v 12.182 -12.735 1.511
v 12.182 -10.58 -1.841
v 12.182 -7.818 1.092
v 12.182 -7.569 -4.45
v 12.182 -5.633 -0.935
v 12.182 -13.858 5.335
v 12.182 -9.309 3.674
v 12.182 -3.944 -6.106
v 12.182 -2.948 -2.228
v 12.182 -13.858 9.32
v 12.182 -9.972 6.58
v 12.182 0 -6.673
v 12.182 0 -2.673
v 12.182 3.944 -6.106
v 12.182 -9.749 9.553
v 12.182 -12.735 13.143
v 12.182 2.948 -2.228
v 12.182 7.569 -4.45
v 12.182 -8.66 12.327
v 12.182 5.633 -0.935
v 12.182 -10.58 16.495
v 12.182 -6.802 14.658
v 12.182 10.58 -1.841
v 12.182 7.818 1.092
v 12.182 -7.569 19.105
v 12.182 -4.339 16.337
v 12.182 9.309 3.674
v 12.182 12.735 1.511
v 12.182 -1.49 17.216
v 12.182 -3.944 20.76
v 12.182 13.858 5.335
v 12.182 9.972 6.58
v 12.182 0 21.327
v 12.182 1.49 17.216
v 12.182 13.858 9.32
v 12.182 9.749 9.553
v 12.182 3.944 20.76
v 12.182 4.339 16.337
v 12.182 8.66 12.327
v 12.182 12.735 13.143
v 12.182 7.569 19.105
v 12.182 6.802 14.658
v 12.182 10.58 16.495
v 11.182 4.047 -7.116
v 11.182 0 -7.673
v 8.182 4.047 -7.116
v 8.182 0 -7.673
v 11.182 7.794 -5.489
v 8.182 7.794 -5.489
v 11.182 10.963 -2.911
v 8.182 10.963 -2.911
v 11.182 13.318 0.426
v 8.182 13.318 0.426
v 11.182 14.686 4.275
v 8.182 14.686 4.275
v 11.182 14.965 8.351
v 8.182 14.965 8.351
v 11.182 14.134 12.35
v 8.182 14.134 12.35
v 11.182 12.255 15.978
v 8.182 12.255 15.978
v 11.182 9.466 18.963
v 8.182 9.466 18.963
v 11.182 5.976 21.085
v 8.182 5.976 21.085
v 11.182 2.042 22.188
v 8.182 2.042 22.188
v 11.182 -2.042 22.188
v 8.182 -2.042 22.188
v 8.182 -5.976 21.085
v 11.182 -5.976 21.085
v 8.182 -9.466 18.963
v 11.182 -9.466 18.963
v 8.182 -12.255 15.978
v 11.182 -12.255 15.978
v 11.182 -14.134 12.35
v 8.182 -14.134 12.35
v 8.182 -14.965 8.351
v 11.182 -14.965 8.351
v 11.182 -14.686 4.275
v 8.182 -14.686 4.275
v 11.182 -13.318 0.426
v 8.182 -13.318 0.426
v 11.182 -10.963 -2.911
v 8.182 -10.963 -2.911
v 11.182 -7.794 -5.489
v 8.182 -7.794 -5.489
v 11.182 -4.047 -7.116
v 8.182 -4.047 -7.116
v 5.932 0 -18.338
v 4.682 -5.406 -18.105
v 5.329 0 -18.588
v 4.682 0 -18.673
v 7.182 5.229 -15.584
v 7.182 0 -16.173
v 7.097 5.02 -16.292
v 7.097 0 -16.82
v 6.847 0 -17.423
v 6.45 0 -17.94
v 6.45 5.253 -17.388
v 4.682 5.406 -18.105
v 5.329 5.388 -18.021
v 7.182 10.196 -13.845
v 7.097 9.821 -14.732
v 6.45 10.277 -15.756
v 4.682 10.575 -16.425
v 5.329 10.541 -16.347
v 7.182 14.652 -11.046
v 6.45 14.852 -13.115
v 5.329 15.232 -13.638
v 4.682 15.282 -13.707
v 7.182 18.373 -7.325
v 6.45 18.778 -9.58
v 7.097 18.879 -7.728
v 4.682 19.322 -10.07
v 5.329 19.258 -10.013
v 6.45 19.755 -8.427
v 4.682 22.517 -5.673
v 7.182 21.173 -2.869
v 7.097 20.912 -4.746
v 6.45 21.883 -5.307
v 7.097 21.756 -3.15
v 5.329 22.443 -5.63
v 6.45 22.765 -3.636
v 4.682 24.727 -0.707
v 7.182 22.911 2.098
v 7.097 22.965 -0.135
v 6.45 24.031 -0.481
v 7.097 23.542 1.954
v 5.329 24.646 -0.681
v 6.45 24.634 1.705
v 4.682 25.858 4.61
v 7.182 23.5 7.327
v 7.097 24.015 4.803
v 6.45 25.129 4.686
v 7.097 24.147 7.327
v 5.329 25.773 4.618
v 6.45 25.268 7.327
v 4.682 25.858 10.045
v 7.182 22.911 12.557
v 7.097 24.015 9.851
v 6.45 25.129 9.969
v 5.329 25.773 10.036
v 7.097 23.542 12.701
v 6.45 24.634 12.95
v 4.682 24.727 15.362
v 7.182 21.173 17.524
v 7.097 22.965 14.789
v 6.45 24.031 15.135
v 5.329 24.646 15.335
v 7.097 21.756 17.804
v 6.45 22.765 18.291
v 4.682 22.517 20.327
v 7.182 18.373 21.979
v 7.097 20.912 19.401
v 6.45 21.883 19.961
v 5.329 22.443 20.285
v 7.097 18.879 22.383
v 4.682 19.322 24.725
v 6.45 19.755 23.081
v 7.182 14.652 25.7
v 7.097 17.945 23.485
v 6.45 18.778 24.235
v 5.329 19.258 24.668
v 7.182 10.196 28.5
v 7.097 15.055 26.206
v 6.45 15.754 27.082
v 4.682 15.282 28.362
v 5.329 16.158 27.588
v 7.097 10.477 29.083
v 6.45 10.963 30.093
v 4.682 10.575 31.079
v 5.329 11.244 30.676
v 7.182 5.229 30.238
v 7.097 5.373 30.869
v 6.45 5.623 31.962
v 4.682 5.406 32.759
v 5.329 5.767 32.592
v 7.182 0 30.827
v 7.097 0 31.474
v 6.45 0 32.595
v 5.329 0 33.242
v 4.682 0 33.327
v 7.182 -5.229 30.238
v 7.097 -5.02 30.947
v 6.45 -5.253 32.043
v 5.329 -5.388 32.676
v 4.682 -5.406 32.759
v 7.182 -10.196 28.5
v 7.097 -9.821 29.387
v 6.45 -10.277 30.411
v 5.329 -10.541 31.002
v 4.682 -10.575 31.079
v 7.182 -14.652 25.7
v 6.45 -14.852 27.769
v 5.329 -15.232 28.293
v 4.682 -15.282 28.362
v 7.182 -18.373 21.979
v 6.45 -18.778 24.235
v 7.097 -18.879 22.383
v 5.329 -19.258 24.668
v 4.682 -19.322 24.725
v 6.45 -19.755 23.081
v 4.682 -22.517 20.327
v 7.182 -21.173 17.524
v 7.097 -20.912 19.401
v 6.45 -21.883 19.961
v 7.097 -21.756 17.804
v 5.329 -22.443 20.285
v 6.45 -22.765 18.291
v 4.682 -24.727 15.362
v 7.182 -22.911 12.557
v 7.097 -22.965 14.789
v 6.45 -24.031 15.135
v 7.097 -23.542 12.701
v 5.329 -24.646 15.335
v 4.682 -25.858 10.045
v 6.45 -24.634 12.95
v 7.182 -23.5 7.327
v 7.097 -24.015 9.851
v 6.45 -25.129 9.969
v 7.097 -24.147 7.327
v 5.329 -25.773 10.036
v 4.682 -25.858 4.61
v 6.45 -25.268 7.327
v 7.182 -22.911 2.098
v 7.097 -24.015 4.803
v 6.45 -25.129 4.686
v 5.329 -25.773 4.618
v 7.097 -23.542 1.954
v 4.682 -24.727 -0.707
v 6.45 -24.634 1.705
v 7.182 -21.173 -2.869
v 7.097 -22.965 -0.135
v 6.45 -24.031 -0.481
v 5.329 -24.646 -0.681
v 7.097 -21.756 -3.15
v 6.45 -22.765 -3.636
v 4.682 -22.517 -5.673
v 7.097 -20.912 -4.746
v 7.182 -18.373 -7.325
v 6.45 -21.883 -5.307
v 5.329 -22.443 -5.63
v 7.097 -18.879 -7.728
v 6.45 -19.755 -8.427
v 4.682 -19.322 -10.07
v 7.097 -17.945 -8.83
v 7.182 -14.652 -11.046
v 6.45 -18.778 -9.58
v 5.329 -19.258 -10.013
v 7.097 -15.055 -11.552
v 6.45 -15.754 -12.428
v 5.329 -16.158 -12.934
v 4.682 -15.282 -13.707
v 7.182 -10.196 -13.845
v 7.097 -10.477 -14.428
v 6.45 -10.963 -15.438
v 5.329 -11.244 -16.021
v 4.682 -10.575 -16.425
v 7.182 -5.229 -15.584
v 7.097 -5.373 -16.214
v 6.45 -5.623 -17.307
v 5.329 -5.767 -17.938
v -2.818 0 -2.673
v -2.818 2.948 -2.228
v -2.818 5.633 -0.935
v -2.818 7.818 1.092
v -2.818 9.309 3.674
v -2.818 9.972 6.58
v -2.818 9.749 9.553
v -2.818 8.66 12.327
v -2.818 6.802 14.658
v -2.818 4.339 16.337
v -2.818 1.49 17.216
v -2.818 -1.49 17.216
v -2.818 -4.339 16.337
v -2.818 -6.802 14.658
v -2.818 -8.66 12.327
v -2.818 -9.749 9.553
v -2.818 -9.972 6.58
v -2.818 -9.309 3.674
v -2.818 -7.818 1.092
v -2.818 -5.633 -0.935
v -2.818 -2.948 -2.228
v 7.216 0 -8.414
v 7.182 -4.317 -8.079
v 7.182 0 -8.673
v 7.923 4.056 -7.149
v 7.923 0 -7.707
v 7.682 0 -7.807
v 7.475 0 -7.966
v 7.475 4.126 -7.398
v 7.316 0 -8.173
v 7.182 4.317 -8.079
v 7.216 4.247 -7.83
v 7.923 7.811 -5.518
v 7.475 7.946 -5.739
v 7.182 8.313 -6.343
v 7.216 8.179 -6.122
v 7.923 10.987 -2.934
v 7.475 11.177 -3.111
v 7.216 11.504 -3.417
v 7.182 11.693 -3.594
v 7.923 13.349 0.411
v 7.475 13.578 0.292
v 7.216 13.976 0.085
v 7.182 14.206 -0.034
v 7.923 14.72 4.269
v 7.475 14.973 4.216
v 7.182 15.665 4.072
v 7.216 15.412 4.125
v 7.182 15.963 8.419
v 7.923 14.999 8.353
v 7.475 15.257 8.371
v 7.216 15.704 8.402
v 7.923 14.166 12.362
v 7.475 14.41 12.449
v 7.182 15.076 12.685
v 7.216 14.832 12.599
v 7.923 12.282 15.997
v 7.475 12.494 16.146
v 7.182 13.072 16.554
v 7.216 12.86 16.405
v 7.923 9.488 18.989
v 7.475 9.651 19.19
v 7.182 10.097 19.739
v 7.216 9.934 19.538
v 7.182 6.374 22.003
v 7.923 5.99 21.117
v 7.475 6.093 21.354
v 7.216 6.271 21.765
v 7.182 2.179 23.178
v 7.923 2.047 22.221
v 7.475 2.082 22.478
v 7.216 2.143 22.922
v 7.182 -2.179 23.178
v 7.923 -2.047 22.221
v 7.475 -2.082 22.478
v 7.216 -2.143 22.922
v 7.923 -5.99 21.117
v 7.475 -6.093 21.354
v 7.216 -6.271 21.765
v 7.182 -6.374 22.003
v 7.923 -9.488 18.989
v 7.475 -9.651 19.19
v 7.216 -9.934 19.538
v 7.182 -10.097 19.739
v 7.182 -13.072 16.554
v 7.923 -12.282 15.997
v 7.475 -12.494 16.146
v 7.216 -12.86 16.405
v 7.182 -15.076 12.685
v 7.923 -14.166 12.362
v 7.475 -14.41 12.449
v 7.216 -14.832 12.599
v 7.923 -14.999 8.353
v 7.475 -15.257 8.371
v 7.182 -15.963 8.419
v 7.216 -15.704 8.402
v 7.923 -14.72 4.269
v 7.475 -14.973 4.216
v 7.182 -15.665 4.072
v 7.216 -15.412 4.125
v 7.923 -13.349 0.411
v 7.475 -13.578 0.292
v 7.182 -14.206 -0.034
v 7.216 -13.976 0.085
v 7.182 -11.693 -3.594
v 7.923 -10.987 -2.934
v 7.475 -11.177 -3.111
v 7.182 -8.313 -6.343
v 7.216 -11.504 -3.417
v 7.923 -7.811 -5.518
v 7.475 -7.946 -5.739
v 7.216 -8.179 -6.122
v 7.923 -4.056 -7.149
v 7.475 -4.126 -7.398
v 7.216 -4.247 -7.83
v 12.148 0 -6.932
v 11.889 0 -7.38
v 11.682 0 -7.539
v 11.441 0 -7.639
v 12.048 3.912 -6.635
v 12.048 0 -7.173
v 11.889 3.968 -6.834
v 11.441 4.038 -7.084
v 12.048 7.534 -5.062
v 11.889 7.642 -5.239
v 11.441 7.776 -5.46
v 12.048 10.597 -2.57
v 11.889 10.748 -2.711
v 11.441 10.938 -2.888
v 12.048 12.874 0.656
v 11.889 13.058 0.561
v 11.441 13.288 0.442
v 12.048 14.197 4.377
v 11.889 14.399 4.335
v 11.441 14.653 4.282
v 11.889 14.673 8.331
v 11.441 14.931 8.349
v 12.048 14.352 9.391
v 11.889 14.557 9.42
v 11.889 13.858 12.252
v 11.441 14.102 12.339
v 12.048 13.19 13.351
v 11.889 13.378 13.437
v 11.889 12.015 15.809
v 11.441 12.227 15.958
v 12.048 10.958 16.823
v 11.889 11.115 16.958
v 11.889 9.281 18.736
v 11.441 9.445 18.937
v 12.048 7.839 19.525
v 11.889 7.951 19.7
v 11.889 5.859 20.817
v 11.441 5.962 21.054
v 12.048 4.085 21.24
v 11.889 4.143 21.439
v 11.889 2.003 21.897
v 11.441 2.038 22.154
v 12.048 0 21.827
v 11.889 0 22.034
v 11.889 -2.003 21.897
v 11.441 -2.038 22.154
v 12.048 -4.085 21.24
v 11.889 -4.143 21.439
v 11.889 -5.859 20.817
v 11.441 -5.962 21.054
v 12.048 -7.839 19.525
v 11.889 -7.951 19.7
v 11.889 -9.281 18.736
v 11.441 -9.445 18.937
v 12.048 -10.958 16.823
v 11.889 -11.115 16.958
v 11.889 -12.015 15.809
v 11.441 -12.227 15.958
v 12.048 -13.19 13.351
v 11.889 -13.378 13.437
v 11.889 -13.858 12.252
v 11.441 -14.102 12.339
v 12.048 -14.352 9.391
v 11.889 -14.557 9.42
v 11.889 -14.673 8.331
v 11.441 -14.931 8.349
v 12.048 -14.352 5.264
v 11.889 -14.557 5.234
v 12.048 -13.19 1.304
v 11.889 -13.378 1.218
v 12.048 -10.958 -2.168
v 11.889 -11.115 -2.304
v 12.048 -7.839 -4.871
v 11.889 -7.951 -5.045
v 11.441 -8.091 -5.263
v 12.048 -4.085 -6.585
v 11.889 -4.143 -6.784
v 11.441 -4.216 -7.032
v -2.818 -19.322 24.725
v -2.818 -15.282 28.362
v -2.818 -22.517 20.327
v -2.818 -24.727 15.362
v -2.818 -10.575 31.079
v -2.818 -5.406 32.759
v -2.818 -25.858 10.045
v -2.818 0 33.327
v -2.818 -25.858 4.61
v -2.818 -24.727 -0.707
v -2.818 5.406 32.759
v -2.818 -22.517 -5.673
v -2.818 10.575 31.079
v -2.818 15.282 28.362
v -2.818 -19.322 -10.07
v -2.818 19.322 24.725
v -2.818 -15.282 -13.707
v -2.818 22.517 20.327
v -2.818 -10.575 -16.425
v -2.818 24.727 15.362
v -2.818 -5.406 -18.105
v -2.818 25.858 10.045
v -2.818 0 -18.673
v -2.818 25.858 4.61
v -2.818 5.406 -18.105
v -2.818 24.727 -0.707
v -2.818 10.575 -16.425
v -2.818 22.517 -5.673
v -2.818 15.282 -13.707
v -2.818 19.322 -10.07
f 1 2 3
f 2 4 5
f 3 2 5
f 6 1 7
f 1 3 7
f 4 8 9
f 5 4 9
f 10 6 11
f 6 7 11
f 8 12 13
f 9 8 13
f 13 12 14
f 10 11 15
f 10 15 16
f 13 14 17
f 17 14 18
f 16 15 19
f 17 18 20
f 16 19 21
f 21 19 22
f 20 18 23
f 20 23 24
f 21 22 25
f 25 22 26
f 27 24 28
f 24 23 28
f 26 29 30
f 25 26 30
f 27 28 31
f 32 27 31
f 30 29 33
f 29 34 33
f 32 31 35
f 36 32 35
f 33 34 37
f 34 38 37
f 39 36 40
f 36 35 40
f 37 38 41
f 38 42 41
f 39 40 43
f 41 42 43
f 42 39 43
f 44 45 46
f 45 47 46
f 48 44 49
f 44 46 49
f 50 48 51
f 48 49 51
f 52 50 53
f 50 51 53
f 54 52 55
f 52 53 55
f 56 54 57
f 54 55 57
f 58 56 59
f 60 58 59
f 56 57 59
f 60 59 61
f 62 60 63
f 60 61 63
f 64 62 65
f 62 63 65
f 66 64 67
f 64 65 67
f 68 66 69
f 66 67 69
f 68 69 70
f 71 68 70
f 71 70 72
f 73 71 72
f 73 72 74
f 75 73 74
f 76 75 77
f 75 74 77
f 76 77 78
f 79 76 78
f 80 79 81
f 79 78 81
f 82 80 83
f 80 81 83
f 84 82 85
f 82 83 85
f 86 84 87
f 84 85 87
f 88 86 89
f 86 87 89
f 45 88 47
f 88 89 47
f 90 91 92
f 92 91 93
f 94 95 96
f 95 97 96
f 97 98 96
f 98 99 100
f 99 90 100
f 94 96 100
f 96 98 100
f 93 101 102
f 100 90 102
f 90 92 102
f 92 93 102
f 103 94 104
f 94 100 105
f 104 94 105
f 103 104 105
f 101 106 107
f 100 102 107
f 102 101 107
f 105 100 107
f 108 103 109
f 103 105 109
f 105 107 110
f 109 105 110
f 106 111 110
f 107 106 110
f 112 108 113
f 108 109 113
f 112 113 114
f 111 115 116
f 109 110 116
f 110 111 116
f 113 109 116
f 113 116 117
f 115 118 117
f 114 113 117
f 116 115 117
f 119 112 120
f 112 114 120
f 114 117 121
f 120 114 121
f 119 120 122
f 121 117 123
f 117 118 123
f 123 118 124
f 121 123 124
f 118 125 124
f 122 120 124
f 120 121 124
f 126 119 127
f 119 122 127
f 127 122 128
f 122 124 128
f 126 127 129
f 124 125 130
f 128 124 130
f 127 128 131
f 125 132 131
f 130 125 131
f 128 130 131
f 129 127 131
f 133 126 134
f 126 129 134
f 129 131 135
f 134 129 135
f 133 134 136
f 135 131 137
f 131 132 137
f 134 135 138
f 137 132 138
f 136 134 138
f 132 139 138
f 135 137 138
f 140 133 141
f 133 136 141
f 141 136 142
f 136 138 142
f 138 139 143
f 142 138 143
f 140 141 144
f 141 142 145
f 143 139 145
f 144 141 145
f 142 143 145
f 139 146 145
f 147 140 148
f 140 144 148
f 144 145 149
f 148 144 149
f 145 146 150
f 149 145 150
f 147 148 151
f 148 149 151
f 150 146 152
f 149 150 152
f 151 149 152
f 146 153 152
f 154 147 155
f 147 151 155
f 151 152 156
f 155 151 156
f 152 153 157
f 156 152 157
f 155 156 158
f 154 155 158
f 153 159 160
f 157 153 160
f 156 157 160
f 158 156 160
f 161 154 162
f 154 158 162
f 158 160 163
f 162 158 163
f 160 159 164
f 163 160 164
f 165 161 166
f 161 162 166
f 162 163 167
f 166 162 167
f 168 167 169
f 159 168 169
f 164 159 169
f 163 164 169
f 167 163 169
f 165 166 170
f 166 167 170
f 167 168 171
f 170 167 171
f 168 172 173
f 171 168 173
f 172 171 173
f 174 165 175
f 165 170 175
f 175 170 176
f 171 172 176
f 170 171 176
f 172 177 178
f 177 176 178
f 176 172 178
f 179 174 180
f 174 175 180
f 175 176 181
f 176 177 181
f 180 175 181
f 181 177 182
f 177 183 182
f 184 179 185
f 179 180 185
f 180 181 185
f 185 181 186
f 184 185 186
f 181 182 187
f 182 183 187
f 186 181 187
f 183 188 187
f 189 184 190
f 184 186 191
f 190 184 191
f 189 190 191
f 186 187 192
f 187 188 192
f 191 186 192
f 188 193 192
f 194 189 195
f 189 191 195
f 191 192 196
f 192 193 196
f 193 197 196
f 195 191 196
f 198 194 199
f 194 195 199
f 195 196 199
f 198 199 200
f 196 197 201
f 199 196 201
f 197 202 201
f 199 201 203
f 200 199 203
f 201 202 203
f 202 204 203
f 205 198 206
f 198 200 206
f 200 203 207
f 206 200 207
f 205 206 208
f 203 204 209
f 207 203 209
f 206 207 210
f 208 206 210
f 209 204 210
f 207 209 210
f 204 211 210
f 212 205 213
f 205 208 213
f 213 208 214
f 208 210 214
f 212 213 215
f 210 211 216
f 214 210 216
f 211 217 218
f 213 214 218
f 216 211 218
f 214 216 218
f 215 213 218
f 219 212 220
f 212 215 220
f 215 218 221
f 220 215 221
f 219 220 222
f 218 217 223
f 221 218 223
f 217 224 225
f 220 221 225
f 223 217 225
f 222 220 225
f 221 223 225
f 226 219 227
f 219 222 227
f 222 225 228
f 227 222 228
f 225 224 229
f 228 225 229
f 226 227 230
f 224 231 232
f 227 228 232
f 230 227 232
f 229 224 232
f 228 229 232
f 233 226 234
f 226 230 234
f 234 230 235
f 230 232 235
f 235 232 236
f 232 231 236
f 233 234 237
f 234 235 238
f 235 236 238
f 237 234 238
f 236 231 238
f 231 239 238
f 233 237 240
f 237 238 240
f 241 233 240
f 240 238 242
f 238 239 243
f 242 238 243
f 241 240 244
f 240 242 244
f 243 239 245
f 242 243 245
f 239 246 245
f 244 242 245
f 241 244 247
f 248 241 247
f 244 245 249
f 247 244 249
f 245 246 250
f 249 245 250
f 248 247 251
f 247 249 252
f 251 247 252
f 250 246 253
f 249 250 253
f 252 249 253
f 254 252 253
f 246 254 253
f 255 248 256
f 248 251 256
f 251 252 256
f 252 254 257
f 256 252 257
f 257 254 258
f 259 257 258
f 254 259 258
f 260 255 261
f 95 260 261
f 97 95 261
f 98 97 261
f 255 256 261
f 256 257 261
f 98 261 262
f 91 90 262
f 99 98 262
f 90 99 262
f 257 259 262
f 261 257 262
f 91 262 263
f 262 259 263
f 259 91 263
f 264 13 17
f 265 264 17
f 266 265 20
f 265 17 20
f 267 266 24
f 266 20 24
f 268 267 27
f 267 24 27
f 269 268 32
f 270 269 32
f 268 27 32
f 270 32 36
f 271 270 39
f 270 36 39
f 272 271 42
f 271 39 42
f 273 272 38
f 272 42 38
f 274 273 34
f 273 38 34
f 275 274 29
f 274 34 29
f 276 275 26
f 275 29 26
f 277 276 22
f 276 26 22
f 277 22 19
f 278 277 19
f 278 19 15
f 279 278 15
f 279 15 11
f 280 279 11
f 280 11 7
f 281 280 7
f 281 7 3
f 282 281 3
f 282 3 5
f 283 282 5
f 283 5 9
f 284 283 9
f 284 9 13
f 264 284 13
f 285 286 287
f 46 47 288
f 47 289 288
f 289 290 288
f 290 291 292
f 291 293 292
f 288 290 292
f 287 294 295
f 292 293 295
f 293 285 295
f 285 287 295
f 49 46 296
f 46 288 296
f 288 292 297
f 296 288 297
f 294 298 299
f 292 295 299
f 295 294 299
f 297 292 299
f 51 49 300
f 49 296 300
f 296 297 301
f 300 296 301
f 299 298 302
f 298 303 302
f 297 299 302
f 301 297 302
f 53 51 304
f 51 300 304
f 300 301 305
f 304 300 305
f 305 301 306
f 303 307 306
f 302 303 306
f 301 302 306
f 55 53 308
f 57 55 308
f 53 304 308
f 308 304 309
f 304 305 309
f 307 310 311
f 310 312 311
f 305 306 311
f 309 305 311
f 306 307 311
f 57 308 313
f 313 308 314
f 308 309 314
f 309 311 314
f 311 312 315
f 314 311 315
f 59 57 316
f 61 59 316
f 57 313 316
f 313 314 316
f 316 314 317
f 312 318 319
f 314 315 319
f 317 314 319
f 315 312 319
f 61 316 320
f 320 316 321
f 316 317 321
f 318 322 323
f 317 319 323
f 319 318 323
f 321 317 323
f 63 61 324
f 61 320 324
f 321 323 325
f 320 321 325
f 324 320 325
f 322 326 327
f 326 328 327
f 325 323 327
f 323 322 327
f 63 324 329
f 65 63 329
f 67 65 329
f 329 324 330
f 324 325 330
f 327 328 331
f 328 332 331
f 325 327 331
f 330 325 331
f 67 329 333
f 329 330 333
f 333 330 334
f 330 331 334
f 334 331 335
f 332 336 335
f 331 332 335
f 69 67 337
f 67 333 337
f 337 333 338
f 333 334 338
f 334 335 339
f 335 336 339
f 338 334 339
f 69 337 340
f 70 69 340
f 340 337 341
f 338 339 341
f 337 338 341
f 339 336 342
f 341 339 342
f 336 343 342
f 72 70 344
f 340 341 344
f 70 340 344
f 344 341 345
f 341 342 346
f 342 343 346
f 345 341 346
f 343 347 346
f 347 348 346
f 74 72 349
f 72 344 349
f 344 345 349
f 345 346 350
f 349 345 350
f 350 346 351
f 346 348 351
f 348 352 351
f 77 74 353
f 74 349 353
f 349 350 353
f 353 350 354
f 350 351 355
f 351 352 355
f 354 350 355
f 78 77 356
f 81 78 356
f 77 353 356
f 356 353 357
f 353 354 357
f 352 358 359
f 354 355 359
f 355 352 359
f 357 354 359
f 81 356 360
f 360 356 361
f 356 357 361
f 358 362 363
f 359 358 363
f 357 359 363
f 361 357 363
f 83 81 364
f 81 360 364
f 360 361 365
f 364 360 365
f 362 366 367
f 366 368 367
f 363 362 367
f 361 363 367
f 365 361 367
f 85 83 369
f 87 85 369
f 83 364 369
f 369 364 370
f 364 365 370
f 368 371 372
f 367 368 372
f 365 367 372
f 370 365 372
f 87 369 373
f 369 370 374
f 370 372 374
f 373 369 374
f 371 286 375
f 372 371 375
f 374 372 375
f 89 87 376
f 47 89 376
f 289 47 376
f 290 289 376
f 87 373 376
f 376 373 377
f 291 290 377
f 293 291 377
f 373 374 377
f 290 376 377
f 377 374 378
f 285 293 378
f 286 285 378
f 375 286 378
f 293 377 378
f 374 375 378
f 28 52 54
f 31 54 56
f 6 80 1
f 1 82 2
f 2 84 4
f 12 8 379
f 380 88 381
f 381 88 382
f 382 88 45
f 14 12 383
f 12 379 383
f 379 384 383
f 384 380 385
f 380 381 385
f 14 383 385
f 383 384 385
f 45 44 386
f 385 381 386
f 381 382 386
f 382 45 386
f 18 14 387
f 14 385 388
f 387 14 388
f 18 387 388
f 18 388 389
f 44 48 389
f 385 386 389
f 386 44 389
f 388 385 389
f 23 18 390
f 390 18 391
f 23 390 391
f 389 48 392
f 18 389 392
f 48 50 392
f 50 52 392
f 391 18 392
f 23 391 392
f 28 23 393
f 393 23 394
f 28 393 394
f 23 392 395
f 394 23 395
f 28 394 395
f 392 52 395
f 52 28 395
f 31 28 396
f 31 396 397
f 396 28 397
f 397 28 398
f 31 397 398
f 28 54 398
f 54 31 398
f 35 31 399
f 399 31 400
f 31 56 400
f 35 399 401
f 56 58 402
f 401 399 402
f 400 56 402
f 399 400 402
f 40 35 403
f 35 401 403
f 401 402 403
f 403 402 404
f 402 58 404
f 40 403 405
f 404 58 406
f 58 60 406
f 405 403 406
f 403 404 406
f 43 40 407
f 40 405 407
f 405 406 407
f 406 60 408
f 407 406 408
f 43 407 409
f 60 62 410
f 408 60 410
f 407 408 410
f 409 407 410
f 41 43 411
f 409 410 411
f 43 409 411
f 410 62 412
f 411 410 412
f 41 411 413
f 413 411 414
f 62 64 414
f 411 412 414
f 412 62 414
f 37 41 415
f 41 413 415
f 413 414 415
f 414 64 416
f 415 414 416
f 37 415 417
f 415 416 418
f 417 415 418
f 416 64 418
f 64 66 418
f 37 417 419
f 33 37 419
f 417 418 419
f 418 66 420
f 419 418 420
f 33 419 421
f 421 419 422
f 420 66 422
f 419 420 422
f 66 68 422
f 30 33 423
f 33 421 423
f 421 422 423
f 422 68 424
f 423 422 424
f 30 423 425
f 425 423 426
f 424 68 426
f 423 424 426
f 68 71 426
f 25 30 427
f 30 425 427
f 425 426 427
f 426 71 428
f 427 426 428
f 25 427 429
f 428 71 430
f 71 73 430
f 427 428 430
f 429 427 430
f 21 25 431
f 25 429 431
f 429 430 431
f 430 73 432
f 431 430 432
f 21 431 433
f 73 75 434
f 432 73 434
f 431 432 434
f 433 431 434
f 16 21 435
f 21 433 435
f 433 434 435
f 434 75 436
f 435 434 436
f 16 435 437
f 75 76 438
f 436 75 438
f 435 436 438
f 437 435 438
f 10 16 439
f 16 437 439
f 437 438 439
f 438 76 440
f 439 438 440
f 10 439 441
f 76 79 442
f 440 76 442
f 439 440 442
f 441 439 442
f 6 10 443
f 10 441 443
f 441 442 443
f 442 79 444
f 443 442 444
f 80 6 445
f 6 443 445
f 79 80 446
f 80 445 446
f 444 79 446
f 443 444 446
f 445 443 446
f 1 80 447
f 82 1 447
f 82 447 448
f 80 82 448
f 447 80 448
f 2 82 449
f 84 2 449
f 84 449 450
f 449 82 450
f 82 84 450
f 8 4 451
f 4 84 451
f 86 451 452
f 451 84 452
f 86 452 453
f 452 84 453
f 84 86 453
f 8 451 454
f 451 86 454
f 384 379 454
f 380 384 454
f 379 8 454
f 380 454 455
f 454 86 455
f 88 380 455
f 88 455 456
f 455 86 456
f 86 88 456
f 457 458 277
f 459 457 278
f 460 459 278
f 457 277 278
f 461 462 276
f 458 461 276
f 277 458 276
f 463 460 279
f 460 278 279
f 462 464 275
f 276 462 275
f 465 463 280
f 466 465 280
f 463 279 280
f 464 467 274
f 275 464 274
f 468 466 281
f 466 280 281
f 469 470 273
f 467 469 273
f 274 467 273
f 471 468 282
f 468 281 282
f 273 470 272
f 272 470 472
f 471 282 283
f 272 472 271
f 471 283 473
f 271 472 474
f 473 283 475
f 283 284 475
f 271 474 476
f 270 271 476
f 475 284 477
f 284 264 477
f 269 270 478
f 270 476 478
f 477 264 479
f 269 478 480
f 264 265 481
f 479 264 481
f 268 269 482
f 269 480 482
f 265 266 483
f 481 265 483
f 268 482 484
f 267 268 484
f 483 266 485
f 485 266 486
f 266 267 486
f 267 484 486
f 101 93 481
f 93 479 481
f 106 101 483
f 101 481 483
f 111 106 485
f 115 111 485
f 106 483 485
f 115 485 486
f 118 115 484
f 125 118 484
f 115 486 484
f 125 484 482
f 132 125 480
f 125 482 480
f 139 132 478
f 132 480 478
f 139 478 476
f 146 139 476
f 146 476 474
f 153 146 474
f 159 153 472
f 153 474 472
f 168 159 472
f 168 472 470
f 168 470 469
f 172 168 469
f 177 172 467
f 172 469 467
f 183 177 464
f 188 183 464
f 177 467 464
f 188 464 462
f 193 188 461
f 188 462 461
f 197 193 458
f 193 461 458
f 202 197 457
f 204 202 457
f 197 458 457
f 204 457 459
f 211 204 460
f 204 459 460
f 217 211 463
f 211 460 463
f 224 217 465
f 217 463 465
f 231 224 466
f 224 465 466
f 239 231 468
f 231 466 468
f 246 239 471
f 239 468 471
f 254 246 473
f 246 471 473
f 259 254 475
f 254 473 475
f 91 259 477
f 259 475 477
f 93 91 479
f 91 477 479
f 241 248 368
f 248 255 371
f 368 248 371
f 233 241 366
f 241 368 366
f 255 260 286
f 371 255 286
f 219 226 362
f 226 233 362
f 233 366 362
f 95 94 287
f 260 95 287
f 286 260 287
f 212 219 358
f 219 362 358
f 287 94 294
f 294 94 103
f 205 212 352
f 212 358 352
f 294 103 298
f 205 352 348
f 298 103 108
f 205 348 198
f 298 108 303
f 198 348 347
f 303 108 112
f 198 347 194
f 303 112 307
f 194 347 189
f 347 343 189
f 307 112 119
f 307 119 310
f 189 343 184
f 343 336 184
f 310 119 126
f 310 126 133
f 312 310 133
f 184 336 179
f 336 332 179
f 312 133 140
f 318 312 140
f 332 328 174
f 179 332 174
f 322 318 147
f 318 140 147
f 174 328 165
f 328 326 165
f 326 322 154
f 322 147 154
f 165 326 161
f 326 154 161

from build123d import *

# Parameters (mm, degrees)
SKETCH2_R      = 10
EXTRUDE1_DEPTH = 16


with BuildPart() as part:
    # Sketch1 → Revolve1 (revolve)
    with BuildSketch(Plane(origin=(0, 0, 0), x_dir=(1, 0, 0), z_dir=(0, 1, 0))):
        with BuildLine():
            Line((-2.818193867, -7.327304055), (1.105880126, -7.327304055))
            Line((1.105880126, -7.327304055), (12.181806133, -7.327304055))
            Line((12.181806133, -7.327304055), (12.181806133, 6.672695945))
            ThreePointArc((12.181806133, 6.672695945), (11.888912914, 7.379802726), (11.181806133, 7.672695945))
            Line((11.181806133, 7.672695945), (8.181806133, 7.672695945))
            ThreePointArc((8.181806133, 7.672695945), (7.474699351, 7.965589164), (7.181806133, 8.672695945))
            Line((7.181806133, 8.672695945), (7.181806133, 16.172695945))
            ThreePointArc((7.181806133, 16.172695945), (6.449573086, 17.940462898), (4.681806133, 18.672695945))
            Line((4.681806133, 18.672695945), (-2.818193867, 18.672695945))
            Line((-2.818193867, 18.672695945), (-2.818193867, -7.327304055))
        make_face()
    revolve(axis=Axis((-2.818193867, 0, 7.327304055), (1, 0, 0)))

    # Sketch2 → Extrude1 (cut, through all)
    with BuildSketch(Plane(origin=(12.181806133, 0, 0), x_dir=(0, 0, -1), z_dir=(1, 0, 0))):
        with Locations((-7.327304055, 0)):
            Circle(SKETCH2_R)
    extrude(amount=-EXTRUDE1_DEPTH, mode=Mode.SUBTRACT)


solid = part.part
